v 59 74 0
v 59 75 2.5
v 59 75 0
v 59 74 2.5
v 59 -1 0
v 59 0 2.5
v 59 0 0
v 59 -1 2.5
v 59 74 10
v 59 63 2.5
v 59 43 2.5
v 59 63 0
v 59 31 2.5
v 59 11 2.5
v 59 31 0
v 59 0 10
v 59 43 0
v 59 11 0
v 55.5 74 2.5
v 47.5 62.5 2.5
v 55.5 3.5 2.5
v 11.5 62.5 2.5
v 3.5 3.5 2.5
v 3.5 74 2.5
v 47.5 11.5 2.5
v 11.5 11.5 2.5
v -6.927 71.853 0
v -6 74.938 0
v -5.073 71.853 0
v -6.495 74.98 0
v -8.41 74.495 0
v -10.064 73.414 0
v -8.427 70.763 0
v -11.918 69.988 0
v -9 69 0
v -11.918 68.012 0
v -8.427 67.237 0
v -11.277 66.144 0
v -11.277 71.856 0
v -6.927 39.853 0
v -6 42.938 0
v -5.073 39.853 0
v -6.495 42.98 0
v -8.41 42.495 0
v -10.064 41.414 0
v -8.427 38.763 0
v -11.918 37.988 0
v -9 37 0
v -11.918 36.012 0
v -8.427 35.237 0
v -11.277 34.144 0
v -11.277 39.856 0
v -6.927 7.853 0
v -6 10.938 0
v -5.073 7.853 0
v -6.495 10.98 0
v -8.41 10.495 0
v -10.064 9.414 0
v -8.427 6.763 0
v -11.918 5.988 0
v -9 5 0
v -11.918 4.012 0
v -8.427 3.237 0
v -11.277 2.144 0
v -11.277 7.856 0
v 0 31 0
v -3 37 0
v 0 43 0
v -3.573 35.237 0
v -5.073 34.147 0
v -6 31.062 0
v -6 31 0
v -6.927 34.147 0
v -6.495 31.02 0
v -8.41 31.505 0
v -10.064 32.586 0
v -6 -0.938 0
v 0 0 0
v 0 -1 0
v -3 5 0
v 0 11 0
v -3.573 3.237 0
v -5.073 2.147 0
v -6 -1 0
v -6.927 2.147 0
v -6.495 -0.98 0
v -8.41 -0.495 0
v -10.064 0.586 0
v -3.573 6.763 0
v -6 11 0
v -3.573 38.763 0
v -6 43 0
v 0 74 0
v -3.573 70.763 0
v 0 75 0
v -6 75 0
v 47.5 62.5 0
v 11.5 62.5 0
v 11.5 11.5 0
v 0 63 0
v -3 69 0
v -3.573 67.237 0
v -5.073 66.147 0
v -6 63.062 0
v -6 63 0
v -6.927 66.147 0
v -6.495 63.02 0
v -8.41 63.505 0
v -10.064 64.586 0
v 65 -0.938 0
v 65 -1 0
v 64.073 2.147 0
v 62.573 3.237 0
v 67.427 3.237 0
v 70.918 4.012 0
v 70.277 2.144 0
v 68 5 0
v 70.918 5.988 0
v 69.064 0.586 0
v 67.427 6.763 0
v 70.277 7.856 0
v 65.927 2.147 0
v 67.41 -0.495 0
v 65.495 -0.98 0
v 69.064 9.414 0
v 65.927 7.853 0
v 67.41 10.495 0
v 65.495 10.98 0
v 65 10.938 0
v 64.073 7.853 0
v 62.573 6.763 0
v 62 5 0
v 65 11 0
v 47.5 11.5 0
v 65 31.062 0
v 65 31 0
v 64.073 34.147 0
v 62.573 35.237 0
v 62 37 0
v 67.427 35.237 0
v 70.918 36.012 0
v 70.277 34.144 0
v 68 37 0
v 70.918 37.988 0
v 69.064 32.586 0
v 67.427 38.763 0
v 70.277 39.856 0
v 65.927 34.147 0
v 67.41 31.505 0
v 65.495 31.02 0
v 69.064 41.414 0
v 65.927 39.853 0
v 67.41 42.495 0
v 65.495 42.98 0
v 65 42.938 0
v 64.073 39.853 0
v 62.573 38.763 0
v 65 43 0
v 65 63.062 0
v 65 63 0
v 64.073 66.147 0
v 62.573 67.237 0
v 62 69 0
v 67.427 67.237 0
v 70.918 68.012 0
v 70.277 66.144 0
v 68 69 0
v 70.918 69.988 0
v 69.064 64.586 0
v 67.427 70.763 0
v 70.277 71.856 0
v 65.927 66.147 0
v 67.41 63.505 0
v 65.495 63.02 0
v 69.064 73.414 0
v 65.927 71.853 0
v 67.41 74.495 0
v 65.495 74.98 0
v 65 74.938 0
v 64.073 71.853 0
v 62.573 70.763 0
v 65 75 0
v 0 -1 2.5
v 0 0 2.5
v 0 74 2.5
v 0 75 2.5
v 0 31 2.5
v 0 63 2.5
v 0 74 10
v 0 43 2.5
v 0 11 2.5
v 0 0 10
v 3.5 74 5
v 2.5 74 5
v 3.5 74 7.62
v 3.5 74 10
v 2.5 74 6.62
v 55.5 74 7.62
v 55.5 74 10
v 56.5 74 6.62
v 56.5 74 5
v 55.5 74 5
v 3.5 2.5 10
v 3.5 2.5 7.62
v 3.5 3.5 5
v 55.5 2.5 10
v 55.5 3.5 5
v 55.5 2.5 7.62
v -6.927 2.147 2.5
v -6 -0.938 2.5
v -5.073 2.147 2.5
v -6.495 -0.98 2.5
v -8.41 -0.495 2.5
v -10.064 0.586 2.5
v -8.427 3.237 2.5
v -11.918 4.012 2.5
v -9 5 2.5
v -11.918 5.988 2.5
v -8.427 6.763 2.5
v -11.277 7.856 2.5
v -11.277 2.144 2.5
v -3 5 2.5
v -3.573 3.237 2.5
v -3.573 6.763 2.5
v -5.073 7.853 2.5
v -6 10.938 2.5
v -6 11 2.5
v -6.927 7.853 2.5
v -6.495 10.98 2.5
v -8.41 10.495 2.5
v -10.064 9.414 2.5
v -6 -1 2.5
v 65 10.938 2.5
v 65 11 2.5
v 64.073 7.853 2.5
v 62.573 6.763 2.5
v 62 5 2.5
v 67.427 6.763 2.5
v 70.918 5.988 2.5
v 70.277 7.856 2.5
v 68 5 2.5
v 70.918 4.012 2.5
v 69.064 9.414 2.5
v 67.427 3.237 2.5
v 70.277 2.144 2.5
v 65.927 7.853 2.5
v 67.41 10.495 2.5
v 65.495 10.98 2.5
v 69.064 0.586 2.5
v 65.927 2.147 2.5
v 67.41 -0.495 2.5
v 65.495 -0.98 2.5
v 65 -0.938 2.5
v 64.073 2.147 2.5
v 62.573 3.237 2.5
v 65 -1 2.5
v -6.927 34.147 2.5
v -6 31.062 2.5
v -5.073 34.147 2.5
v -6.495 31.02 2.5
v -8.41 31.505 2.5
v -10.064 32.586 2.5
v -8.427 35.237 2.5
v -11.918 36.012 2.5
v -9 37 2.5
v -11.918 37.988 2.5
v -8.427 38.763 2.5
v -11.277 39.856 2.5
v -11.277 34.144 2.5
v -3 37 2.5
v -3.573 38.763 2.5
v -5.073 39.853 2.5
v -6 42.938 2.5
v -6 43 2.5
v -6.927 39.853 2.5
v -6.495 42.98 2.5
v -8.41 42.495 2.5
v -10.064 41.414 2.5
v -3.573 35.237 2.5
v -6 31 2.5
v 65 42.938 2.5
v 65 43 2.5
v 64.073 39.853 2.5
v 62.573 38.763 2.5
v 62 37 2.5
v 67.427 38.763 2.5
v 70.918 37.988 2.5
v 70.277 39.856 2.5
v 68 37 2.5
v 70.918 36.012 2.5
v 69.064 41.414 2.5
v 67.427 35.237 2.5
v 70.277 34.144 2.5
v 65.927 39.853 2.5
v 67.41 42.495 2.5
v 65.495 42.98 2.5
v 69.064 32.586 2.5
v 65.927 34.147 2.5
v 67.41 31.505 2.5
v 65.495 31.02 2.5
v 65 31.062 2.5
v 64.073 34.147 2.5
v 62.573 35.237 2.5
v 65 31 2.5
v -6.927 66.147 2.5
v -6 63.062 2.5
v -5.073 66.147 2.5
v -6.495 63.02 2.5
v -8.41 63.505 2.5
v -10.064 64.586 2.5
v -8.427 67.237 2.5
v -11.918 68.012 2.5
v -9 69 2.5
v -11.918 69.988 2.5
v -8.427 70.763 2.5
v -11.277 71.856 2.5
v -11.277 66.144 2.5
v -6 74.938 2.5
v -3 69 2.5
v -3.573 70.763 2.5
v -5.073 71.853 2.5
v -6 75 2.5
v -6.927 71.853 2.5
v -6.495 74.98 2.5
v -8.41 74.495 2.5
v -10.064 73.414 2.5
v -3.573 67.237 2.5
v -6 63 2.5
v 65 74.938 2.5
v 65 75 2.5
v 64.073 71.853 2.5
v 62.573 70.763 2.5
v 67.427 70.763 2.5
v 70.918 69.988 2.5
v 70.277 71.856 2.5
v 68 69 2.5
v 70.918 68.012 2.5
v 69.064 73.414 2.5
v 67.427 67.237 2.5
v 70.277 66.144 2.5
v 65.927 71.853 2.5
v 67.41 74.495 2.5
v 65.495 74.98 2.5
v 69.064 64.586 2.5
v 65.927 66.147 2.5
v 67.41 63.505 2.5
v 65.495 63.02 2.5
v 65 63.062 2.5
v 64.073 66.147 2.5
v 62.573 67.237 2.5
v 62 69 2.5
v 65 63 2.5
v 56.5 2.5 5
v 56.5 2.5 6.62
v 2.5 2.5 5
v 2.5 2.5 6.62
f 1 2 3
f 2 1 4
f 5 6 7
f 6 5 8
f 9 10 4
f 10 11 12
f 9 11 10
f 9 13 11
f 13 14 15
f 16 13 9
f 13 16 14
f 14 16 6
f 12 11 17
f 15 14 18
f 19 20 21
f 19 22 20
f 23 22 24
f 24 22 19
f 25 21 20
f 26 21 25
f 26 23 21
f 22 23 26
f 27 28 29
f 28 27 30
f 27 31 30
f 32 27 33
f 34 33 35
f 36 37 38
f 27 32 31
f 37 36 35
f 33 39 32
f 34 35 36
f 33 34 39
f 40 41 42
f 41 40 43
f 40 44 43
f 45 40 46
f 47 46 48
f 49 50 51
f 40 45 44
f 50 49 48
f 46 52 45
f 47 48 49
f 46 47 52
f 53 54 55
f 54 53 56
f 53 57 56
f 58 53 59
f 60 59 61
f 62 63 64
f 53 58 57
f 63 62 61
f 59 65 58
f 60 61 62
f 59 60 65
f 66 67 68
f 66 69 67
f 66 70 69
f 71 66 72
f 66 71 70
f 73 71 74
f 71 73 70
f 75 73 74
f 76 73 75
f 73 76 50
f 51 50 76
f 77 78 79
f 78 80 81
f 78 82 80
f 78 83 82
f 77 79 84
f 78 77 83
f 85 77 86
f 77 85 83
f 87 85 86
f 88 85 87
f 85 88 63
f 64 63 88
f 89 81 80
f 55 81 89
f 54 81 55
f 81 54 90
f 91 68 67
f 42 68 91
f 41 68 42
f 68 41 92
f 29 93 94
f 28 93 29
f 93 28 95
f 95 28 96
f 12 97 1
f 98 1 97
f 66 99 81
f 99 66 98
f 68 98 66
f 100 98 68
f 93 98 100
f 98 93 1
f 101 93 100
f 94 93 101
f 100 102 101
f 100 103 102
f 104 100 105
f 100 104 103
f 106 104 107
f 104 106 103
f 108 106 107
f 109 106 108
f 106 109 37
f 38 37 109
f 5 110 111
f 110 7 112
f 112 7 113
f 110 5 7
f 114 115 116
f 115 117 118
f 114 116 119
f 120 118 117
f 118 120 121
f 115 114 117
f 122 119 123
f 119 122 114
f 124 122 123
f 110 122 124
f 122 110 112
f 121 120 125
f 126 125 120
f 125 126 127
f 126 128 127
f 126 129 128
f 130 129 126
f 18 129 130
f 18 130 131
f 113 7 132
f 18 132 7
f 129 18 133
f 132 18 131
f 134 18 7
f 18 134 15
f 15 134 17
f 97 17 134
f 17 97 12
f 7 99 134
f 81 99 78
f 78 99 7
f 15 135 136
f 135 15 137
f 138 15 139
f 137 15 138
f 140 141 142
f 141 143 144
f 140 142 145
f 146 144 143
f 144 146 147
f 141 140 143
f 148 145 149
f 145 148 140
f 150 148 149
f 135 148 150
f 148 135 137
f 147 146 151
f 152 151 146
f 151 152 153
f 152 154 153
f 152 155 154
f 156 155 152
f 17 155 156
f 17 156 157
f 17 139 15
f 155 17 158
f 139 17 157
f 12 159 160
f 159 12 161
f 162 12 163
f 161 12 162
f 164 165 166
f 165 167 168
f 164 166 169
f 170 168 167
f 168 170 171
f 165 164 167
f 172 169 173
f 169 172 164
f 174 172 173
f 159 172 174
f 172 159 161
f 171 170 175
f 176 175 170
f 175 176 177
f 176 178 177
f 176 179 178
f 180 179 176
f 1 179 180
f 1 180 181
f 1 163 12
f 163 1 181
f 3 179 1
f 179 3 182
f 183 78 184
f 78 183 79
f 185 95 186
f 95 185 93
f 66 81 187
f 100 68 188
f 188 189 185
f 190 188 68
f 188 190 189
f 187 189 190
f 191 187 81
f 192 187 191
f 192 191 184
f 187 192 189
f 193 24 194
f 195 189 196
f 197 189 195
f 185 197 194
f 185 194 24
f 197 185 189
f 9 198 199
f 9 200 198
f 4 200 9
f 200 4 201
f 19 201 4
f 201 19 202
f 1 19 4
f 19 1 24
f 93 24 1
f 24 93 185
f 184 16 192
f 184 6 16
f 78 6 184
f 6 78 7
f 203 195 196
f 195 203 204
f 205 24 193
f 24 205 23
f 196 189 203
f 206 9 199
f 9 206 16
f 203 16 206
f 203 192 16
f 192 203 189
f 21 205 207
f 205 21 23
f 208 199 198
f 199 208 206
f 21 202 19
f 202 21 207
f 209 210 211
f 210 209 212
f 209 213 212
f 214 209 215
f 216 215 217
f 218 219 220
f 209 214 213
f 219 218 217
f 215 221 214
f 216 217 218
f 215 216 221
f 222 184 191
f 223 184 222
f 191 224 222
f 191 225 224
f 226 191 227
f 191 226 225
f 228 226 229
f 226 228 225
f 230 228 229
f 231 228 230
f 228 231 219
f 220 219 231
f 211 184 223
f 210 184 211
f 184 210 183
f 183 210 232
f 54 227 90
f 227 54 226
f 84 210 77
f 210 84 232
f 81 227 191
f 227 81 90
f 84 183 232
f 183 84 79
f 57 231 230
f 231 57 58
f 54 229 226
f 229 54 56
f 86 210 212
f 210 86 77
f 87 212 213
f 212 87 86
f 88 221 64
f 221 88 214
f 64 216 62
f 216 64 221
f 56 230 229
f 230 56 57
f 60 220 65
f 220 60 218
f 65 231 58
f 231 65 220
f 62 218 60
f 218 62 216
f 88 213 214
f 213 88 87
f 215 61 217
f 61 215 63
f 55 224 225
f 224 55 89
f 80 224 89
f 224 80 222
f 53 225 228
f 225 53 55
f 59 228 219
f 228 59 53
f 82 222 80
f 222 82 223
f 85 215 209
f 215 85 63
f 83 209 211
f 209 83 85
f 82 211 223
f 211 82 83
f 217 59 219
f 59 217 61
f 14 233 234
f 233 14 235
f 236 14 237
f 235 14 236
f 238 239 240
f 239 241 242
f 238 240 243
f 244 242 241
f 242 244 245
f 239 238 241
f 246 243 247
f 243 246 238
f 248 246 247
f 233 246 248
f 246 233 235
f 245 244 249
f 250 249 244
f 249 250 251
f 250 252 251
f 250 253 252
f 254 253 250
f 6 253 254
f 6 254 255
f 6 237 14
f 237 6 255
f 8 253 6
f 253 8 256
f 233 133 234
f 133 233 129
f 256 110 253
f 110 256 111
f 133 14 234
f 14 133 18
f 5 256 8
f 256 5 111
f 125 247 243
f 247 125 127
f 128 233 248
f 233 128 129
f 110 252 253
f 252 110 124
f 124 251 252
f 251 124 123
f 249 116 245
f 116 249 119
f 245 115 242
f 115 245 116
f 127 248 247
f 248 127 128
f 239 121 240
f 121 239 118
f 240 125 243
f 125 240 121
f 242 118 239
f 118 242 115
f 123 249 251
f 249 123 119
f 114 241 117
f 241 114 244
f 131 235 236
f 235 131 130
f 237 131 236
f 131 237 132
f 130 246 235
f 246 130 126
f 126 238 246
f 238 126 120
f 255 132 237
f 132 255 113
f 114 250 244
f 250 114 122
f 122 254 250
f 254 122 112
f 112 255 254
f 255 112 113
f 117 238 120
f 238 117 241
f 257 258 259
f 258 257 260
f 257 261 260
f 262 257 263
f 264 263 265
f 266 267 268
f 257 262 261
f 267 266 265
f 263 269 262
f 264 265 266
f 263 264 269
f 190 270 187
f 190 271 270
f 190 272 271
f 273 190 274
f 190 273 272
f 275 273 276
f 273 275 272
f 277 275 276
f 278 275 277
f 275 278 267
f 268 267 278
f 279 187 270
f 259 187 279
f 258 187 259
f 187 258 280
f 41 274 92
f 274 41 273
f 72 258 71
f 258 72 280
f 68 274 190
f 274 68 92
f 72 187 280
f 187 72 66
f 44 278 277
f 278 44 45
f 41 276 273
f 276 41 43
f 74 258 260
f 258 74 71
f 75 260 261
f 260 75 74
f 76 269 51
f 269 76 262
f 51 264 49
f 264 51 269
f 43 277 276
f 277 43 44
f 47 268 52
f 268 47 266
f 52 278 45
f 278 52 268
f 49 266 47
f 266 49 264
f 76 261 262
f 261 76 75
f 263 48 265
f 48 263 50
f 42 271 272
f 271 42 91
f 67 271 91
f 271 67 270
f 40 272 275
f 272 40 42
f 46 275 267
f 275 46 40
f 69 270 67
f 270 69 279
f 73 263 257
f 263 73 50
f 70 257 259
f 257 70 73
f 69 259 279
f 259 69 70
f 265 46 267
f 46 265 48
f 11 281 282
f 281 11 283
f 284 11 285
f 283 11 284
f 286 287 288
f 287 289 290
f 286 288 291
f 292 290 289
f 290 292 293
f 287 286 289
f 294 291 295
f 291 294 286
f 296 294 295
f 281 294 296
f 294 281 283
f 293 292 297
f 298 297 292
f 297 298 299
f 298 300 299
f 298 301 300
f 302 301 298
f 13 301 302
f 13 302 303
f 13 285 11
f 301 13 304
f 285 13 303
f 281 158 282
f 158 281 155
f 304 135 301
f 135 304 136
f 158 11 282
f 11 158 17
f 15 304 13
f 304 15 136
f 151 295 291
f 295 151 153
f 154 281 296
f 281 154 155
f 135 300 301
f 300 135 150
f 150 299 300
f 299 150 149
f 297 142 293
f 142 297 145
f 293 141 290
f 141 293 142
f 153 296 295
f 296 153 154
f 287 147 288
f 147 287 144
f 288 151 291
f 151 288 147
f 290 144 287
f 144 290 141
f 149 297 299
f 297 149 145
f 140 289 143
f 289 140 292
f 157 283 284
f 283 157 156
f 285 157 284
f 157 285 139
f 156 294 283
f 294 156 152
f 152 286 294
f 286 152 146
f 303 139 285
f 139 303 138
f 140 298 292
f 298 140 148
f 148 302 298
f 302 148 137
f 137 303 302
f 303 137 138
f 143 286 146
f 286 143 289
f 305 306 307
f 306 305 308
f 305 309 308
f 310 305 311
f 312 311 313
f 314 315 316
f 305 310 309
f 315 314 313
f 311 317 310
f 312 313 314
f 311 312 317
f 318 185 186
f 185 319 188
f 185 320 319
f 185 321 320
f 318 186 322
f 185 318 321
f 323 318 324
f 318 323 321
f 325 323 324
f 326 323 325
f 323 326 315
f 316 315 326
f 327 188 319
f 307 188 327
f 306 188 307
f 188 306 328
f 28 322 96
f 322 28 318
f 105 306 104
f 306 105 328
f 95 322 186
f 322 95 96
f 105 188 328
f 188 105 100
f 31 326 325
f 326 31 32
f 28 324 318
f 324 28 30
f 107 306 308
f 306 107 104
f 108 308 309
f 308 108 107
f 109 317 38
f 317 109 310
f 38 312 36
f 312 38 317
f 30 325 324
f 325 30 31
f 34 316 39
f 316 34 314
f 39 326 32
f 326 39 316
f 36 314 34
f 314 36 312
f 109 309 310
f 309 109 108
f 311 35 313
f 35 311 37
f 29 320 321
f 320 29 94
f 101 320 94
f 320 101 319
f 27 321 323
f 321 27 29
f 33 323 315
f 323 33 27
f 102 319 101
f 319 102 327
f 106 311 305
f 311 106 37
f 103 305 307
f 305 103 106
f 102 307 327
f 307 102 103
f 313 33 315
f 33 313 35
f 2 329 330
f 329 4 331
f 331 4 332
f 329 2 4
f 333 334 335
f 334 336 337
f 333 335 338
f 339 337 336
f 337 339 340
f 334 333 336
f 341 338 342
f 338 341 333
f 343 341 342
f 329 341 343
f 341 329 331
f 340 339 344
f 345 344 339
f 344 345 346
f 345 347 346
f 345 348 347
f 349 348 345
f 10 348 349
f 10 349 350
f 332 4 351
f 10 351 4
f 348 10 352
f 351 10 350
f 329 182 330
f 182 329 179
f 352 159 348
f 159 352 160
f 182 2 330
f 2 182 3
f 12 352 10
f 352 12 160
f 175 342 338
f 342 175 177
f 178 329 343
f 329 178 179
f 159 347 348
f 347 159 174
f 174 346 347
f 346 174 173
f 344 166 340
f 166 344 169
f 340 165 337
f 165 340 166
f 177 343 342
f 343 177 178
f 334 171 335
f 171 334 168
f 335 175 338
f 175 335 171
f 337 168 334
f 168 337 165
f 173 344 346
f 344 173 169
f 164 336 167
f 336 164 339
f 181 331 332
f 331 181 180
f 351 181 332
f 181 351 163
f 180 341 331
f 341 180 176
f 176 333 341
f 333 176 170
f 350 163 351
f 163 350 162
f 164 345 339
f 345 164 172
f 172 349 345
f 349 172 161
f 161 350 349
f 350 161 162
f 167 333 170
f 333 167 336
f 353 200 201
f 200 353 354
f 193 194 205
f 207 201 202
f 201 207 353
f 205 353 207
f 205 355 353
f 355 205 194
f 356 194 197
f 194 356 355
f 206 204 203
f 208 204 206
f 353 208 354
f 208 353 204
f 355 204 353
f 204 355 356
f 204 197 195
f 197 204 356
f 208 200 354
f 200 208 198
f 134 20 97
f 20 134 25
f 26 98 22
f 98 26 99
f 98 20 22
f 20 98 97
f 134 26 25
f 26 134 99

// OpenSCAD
/* pcb_box_slide_with_tabs.scad
 * By Nicholas C Lewis - Jan 1, 2011
 * http://www.thingiverse.com/thing:5396 
 *
 * derived from pcb_box_slide.scad 
 *     Parametric, open PCB-box (slide-in) by chlunde
 *     http://www.thingiverse.com/thing:4071
 *
 * CHANGES
 * - adjusted to fit Arduino Mega
 * - added mounting tabs
 * - turned off cutouts
 * - adjusted bottom cutout size
 */

//Uno is 2.7" x 2.1" which is 68.58 mm x 53.34 mm
//Round up to 69 mm x 54 mm
pcb_width = 54;
pcb_length =69;
pcb_height =1.62;
slisse = 1;

pcb_bottom_margin = 2.5;
wall_width_thick = 3.5;
wall_width = wall_width_thick-slisse;
box_height = 10;

//tab parameters
tab_hole_radius=3;
tab_outer_radius=6;



module tab() {
	difference(){
		union() {
			translate([-tab_outer_radius,-tab_outer_radius,0])
			cube([tab_outer_radius,2*tab_outer_radius,wall_width]);
			translate([-tab_outer_radius,0,0])
				cylinder(r=tab_outer_radius, h = wall_width);
		}
		translate([-tab_outer_radius,0,0])
		cylinder(r= tab_hole_radius, h = wall_width+3,center=true);
	}

}

module box() {
  union() {
    cube([pcb_width + 2*wall_width, pcb_length + 2*wall_width, wall_width]);

    cube([wall_width_thick, pcb_length + 2*wall_width, box_height]);

    cube([pcb_width + 2*wall_width, wall_width_thick, box_height]);

    %translate([0, pcb_length+wall_width, 0])
      cube([pcb_width + 2*wall_width,wall_width,box_height]);

    translate([pcb_width + wall_width - slisse,0,0])
      cube([wall_width_thick, pcb_length + 2*wall_width, box_height]);
  }
//comment out this part to remove tabs
 for(i=[5,(pcb_length + 2*wall_width)/2,pcb_length + 2*wall_width-5]){
	translate([0,i,0])tab();
	translate([pcb_width + 2*wall_width,i,0])mirror()tab();
 }


}

module pcb() {
  translate([wall_width, wall_width, wall_width + pcb_bottom_margin])
    cube([pcb_width,pcb_length + wall_width + 0.1,pcb_height]);
  translate([wall_width, wall_width, wall_width + pcb_bottom_margin+pcb_height])rotate([0,45,0])
    cube([pcb_height,pcb_length + wall_width + 0.1,pcb_height]);
  translate([wall_width+pcb_width-2*cos(45)*pcb_height, wall_width, wall_width + pcb_bottom_margin+pcb_height])rotate([0,45,0])
    cube([pcb_height,pcb_length + wall_width + 0.1,pcb_height]);
  translate([wall_width_thick, wall_width, wall_width + pcb_bottom_margin])
    cube([pcb_width-2*slisse,pcb_length + wall_width + 0.1,box_height]);

}



module holes() {
  *translate([wall_width + pcb_width/2, wall_width_thick + 0.1, pcb_width/2+wall_width])
    rotate(a=90,v=[1,0,0])
      cylinder(r=pcb_width/2, h=wall_width_thick + 0.2);

  *translate([-0.1, wall_width + pcb_length/2, pcb_length/2 + wall_width])
    rotate(a=90,v=[0,1,0])
      cylinder(r=pcb_length/2, h=wall_width_thick + 0.2);

  *translate([pcb_width + wall_width - slisse - 0.1, wall_width + pcb_length/2, pcb_length/2 + wall_width])
    rotate(a=90,v=[0,1,0])
      cylinder(r=pcb_length/2, h=wall_width_thick + 0.2);

 * translate([pcb_width/2 + wall_width, wall_width + pcb_length/2, -0.1])
    rotate(a=0,v=[0,1,0])
      cylinder(r=min(pcb_length,pcb_width)/2 - wall_width/2, h=wall_width_thick + 0.2);
   
  inner_margin = 9;
  translate([inner_margin +wall_width, inner_margin+wall_width, -0.1])
    cube([pcb_width-inner_margin*2,pcb_length -inner_margin*2,wall_width + 0.2]);
}

difference() {
  box();
  pcb();
  holes();
}

* color([1,0,0])
  translate([pcb_width/2 + wall_width, wall_width + pcb_length/2, -0.1])
    rotate(a=0,v=[0,1,0])
      cylinder(r=min(pcb_length,pcb_width)/2 - wall_width/2, h=wall_width_thick + 0.2);
